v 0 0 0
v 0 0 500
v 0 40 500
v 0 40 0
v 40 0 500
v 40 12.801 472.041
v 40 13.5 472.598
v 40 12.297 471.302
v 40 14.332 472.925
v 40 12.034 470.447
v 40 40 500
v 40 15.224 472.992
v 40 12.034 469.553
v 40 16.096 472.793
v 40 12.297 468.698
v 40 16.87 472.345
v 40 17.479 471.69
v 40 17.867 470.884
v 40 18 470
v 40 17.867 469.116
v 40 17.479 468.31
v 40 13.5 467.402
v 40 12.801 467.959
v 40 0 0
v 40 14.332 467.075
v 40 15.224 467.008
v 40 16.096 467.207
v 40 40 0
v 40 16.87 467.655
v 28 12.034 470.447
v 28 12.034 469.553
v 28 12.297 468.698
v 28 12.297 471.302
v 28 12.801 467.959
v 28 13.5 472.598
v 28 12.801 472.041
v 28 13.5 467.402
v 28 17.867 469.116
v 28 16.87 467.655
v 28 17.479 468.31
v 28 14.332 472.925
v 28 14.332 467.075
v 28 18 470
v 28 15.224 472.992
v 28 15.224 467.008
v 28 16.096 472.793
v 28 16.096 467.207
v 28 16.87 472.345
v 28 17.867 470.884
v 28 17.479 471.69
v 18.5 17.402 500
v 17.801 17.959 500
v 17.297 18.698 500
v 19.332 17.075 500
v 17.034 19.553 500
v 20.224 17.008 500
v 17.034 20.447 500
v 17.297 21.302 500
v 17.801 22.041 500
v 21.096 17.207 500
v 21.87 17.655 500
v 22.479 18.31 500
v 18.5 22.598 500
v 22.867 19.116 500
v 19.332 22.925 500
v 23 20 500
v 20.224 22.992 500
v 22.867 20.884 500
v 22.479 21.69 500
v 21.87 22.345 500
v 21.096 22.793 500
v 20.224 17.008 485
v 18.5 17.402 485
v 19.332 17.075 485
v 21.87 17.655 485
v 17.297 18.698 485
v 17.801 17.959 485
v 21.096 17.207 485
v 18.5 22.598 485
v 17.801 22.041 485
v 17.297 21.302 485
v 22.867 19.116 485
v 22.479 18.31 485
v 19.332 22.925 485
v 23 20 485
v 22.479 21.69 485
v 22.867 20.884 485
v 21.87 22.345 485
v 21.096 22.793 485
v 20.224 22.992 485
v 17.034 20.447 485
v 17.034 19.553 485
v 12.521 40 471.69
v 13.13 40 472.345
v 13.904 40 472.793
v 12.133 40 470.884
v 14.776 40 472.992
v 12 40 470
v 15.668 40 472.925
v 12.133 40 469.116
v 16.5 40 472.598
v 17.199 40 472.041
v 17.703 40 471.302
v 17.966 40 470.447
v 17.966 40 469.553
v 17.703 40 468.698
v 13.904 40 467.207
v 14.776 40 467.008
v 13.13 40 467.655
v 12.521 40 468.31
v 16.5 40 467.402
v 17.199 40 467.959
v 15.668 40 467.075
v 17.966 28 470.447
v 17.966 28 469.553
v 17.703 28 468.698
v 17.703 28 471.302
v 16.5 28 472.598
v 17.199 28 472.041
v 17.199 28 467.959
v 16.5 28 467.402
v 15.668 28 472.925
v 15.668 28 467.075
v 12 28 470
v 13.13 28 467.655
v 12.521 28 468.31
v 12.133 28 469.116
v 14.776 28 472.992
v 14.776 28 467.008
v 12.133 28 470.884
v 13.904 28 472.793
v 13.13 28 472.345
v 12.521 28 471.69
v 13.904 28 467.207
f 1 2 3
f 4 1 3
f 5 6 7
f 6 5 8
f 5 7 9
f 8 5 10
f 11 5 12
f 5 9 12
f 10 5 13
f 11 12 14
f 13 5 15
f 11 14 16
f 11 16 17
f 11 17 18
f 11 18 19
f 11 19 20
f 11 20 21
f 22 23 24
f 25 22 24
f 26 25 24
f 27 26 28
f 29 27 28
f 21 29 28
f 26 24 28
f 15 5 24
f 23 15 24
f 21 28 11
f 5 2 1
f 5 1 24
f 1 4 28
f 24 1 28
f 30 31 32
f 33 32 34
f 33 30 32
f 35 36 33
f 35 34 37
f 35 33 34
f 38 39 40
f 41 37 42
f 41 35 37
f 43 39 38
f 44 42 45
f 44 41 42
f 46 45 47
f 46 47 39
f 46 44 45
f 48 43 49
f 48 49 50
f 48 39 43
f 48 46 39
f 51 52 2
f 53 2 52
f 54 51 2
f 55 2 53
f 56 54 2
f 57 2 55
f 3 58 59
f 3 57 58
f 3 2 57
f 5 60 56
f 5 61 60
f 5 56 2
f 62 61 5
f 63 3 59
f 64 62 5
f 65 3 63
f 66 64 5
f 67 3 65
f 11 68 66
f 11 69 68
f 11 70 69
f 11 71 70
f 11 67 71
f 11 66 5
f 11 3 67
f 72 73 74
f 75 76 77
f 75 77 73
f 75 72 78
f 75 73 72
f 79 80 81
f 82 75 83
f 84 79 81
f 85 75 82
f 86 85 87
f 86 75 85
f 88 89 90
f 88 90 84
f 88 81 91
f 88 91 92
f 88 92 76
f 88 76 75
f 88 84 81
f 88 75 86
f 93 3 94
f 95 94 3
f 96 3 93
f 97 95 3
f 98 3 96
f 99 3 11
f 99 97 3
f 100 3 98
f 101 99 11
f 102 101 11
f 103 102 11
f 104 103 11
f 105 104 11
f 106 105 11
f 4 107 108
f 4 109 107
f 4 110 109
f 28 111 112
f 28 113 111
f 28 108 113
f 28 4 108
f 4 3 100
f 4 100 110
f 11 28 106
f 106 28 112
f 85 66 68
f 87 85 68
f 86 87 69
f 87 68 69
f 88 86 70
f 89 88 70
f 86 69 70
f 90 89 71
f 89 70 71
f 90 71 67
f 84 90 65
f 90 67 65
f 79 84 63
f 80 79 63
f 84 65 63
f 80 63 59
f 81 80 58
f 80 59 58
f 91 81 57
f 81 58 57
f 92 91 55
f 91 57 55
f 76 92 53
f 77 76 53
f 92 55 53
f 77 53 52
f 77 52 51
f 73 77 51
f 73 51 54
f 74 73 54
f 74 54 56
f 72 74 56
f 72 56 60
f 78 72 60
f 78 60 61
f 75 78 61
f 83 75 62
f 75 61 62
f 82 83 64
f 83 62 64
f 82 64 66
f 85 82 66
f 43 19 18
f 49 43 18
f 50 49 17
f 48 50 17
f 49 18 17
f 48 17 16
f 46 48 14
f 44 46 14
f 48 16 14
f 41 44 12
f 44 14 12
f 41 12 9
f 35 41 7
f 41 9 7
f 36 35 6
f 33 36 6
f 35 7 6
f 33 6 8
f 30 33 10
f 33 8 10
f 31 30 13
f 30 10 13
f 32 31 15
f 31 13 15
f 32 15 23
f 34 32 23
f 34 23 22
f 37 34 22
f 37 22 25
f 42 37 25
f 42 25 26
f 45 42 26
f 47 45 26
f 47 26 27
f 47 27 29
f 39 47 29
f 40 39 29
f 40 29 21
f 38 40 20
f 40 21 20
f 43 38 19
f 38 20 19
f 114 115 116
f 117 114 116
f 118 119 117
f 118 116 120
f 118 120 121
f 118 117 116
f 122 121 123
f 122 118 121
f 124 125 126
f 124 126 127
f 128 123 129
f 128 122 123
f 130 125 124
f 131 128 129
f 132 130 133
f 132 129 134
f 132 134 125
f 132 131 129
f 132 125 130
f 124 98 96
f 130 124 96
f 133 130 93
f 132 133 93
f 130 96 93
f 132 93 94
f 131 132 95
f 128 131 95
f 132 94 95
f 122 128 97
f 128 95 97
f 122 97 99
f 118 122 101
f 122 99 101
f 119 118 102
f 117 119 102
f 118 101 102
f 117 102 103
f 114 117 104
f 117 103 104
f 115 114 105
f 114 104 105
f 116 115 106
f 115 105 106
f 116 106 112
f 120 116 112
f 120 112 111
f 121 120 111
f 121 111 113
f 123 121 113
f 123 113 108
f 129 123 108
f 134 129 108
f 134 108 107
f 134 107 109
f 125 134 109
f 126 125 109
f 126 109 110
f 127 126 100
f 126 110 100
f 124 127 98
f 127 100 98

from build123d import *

# Parameters (mm, degrees)
F0_W     = 40
F0_H     = 40
F1_DEPTH = 500
F2_R     = 3
F3_DEPTH = 12
F4_R     = 3
F5_DEPTH = 12
F6_R     = 3
F7_DEPTH = 15


with BuildPart() as f1:
    # F0 (on Top) → F1 (new body)
    with BuildSketch(Plane.XY):
        with Locations((20, 20)):
            Rectangle(F0_W, F0_H)
    extrude(amount=F1_DEPTH)

    # F2 (on face) → F3 (cut)
    with BuildSketch(Plane.YZ.offset(40)):
        with Locations((15, 470)):
            Circle(F2_R)
    extrude(amount=-F3_DEPTH, mode=Mode.SUBTRACT)

    # F4 (on face) → F5 (cut)
    with BuildSketch(Plane(origin=(0, 40, 0), x_dir=(-1, 0, 0), z_dir=(0, 1, 0))):
        with Locations((-15, 470)):
            Circle(F4_R)
    extrude(amount=-F5_DEPTH, mode=Mode.SUBTRACT)

    # F6 (on face) → F7 (cut)
    with BuildSketch(Plane.XY.offset(500)):
        with Locations((20, 20)):
            Circle(F6_R)
    extrude(amount=-F7_DEPTH, mode=Mode.SUBTRACT)


solid = f1.part
